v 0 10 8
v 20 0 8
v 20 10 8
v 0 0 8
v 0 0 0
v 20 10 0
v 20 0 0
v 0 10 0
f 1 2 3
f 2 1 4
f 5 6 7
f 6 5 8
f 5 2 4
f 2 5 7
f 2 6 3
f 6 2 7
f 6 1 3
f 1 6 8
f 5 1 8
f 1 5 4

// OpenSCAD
// Zweck: -D ohne Modulkontext setzt Zuweisungen auf oberster Ebene (wie openscad -D).
w = 20;
d = w / 2;
h = 5;
h = 8; // die letzte Zuweisung gilt
cube([w, d, h]);
